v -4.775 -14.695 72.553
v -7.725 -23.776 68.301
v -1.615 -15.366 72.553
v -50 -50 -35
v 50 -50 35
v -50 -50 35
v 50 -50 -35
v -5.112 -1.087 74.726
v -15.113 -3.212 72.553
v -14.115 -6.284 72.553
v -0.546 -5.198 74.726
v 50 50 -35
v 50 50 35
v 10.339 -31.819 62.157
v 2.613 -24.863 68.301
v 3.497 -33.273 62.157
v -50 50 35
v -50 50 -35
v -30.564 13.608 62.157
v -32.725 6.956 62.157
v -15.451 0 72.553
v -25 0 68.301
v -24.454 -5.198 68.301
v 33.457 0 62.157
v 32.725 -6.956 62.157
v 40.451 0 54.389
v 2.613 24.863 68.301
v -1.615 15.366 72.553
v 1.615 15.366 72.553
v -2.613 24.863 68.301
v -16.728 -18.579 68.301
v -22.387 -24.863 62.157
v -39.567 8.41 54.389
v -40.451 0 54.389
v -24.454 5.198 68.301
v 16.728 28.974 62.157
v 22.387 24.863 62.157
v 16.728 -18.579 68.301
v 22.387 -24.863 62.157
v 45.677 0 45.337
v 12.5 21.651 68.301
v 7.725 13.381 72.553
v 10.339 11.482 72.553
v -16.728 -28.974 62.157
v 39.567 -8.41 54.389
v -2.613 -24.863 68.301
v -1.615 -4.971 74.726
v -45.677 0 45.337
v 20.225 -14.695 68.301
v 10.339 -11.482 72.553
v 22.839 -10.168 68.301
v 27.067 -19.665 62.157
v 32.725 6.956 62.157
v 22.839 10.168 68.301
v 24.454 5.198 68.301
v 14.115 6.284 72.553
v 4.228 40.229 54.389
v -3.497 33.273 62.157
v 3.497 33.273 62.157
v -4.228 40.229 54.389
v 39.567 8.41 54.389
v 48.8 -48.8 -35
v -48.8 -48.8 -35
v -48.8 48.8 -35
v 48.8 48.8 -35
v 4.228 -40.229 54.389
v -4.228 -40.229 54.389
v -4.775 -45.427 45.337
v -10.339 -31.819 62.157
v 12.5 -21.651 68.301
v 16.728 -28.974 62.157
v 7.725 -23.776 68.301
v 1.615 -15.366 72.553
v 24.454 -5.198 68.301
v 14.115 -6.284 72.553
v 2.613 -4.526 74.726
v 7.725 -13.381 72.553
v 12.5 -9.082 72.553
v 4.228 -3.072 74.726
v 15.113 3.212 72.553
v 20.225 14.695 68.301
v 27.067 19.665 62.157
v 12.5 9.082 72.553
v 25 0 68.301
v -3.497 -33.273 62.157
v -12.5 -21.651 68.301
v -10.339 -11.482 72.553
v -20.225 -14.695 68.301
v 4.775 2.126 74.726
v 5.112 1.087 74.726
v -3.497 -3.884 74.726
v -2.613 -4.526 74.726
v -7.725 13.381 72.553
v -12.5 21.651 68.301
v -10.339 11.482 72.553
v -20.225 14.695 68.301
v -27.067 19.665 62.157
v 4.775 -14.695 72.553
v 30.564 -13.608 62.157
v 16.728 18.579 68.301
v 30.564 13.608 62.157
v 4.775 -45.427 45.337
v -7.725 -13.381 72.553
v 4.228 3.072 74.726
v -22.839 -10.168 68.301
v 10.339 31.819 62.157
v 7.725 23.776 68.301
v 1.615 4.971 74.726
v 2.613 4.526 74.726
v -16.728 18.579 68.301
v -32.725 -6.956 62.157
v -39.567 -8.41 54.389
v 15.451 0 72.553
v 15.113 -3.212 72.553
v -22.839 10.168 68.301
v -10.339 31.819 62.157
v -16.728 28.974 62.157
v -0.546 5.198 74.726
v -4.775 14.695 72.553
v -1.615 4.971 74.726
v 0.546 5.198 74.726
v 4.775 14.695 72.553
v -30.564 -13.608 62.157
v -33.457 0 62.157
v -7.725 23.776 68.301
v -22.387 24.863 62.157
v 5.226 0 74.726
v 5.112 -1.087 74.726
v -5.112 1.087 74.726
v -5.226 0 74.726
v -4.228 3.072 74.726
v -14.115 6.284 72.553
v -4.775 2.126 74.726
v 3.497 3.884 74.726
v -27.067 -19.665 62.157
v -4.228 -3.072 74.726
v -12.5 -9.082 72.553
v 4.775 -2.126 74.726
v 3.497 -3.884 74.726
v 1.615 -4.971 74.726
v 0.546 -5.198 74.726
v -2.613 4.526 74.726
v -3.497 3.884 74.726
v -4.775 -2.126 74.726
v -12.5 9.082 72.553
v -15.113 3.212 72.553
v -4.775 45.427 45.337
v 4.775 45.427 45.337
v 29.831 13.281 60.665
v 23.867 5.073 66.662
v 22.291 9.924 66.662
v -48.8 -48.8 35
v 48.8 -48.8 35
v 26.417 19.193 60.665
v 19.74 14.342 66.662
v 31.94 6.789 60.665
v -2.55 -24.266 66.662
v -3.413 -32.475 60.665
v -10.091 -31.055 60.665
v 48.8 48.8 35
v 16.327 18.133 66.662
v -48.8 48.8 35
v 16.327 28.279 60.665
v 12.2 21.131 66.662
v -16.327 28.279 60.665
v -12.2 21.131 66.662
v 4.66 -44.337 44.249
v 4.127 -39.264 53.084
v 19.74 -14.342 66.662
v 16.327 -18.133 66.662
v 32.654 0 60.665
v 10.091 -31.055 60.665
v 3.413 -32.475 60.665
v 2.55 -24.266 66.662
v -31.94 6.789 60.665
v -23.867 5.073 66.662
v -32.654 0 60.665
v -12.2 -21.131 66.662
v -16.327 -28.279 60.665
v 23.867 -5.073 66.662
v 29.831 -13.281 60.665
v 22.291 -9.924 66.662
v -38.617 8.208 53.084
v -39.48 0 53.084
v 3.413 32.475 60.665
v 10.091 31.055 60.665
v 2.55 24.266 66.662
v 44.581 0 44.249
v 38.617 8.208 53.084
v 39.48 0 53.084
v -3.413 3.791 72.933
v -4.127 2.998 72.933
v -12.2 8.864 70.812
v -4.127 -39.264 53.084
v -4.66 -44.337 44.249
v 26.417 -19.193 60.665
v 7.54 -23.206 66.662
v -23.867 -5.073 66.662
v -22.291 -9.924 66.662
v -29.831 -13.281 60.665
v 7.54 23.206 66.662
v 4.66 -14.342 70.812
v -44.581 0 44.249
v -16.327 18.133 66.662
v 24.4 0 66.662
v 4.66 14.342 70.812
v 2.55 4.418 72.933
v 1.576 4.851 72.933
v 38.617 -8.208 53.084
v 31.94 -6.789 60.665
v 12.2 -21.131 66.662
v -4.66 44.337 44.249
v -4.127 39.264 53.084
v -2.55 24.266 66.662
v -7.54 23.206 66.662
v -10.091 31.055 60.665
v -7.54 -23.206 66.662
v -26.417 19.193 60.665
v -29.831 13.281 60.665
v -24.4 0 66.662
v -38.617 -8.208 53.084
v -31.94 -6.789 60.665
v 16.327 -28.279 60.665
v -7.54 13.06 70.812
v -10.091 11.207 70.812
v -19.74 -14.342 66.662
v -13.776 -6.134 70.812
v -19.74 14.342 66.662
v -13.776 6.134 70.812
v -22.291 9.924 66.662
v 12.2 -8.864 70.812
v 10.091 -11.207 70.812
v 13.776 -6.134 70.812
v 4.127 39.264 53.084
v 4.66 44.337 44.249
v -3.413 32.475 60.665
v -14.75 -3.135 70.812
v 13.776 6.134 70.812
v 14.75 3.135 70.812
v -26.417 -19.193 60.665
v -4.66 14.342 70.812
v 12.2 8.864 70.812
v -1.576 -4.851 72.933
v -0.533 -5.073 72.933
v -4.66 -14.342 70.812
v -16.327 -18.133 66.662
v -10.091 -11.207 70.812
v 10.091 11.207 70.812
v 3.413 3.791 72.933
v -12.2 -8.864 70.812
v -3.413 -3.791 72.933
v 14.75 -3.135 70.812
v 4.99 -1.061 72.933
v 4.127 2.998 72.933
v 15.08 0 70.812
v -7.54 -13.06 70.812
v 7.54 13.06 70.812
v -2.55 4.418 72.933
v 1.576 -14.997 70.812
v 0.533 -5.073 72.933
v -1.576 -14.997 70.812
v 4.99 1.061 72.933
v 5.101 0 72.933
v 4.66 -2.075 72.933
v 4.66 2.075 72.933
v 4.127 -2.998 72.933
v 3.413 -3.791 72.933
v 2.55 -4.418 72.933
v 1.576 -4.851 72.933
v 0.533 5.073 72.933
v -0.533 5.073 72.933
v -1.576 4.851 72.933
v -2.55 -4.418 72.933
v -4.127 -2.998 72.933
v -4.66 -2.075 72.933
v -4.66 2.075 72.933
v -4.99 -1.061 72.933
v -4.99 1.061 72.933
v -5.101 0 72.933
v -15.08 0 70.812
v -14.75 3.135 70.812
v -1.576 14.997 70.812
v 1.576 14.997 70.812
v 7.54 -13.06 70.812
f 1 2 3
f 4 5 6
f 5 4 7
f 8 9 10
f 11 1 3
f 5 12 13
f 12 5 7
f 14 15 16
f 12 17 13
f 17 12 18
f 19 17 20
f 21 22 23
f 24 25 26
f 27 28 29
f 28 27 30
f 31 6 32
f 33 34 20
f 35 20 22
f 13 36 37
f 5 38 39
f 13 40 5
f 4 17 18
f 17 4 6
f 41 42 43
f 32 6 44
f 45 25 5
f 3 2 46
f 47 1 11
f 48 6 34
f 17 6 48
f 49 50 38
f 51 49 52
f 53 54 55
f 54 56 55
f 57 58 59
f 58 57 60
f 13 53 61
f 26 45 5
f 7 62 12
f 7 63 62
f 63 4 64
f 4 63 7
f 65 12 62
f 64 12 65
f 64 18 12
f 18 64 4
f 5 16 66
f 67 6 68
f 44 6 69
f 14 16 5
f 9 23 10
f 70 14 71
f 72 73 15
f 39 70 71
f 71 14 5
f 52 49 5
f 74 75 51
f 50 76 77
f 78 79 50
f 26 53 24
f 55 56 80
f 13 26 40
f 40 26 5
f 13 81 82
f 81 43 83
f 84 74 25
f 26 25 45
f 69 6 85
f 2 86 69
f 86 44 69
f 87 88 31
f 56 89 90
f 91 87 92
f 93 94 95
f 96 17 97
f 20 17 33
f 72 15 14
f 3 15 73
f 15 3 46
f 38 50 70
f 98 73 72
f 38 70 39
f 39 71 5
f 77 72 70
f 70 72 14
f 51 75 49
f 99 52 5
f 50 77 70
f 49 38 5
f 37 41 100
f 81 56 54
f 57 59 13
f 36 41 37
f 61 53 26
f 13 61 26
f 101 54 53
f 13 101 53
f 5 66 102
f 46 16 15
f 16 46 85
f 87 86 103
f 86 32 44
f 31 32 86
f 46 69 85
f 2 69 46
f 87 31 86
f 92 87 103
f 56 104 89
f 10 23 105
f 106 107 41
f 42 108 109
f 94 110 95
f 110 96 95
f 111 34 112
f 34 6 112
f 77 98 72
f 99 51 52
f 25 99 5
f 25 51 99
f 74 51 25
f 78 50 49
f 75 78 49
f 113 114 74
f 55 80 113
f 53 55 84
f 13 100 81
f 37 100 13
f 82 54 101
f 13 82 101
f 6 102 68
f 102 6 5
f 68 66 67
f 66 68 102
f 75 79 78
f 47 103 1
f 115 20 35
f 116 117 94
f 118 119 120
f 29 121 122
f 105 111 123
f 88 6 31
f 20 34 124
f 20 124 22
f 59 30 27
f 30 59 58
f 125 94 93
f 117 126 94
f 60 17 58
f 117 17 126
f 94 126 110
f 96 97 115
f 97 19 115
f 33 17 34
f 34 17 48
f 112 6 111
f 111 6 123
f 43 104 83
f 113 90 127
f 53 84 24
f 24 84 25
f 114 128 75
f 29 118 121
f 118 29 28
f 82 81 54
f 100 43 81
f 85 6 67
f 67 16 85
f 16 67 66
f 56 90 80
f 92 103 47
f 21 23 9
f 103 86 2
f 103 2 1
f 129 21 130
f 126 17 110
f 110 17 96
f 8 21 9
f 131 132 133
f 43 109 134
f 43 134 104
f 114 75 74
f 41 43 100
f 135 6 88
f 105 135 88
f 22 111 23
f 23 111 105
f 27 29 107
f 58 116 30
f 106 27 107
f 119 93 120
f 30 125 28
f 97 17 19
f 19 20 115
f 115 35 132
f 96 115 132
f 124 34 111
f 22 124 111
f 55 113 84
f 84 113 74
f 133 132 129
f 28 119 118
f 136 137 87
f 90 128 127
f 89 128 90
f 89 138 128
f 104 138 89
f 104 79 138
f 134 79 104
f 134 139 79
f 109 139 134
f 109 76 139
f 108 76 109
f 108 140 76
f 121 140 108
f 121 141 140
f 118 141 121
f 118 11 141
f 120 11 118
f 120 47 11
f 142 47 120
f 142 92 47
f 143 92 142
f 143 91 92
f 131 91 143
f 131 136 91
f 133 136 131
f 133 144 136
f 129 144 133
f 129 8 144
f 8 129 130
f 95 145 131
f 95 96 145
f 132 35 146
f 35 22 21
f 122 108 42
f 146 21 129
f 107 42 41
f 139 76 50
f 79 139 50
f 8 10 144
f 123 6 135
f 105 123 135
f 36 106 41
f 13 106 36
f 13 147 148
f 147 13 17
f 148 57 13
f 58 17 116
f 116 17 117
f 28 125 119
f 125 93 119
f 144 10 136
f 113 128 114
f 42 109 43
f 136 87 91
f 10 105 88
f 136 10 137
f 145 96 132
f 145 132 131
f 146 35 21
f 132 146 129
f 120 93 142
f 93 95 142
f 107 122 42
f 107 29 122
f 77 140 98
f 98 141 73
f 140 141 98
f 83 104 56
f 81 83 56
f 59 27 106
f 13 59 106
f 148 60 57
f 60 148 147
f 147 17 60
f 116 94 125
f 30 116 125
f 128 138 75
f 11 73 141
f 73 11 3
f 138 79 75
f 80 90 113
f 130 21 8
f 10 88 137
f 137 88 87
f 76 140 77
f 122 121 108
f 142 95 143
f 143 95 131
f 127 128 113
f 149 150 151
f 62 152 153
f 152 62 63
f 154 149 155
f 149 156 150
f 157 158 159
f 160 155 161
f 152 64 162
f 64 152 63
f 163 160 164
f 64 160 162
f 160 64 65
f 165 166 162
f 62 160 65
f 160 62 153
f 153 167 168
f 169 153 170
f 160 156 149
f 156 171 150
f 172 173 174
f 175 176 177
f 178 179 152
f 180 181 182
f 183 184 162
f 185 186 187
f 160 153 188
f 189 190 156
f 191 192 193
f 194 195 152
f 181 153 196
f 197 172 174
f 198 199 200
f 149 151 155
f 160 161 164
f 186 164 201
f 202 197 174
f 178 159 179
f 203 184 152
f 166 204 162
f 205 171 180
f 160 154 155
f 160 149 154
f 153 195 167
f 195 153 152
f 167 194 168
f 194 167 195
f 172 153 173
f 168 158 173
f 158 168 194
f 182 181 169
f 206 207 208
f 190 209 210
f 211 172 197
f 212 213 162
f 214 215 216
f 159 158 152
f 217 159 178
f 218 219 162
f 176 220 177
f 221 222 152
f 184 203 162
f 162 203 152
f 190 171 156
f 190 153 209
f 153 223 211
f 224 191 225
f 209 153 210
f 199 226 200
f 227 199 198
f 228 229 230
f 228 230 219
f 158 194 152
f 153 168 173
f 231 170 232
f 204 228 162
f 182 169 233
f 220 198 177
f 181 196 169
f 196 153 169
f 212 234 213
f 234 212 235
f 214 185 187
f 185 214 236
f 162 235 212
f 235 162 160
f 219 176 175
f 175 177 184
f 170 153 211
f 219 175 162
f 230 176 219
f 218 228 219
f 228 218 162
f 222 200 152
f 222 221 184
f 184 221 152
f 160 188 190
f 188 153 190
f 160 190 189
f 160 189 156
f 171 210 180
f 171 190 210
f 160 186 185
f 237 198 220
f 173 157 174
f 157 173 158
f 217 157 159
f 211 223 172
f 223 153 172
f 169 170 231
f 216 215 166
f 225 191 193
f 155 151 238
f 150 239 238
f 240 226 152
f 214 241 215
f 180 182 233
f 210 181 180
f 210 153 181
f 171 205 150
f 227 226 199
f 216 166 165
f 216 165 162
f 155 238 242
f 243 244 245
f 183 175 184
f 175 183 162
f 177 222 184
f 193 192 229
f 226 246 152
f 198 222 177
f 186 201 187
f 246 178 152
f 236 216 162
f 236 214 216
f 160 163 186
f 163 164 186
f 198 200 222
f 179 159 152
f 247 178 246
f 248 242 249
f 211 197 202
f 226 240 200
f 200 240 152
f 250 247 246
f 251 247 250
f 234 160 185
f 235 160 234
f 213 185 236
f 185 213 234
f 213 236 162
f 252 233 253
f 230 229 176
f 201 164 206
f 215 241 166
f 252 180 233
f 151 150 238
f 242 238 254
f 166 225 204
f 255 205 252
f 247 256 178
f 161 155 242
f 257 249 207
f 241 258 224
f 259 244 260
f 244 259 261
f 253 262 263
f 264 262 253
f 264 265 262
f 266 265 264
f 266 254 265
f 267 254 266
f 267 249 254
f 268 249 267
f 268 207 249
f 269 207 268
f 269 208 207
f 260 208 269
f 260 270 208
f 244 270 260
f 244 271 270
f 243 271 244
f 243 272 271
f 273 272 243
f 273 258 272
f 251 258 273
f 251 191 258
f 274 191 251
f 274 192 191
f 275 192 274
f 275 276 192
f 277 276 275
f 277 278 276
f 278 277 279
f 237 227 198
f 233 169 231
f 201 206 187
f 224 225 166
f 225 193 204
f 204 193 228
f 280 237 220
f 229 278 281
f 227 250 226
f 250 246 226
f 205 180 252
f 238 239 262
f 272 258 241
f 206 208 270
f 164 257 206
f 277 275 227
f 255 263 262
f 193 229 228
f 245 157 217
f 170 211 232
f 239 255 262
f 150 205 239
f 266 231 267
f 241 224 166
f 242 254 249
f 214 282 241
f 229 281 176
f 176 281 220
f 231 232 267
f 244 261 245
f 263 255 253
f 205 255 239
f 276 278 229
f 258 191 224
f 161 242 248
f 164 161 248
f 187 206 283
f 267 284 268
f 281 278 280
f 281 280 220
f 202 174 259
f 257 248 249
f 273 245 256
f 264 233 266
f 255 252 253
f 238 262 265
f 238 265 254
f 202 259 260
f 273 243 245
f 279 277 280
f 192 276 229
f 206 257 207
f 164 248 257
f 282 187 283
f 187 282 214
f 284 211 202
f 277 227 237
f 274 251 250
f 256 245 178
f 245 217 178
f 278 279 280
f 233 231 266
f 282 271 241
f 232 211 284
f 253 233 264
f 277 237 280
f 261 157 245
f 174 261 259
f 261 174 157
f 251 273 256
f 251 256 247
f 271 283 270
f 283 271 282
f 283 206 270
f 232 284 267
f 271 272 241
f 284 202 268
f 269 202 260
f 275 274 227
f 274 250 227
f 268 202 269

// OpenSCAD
size=100;
depth=70;

module shape(size) {
    hull()
     {
        translate([0,0,size/4])
        // half-sphere
        difference()
        {
            sphere(d=size,$fn=30);
            translate([0,0,-size/4])
                cube([size,size,size/2],center=true);
        
        }
        cube([size,size,depth],center=true);
    }
}

wall_size=1.2;

difference(){
    shape(size);
    shape(size-wall_size*2);
}
